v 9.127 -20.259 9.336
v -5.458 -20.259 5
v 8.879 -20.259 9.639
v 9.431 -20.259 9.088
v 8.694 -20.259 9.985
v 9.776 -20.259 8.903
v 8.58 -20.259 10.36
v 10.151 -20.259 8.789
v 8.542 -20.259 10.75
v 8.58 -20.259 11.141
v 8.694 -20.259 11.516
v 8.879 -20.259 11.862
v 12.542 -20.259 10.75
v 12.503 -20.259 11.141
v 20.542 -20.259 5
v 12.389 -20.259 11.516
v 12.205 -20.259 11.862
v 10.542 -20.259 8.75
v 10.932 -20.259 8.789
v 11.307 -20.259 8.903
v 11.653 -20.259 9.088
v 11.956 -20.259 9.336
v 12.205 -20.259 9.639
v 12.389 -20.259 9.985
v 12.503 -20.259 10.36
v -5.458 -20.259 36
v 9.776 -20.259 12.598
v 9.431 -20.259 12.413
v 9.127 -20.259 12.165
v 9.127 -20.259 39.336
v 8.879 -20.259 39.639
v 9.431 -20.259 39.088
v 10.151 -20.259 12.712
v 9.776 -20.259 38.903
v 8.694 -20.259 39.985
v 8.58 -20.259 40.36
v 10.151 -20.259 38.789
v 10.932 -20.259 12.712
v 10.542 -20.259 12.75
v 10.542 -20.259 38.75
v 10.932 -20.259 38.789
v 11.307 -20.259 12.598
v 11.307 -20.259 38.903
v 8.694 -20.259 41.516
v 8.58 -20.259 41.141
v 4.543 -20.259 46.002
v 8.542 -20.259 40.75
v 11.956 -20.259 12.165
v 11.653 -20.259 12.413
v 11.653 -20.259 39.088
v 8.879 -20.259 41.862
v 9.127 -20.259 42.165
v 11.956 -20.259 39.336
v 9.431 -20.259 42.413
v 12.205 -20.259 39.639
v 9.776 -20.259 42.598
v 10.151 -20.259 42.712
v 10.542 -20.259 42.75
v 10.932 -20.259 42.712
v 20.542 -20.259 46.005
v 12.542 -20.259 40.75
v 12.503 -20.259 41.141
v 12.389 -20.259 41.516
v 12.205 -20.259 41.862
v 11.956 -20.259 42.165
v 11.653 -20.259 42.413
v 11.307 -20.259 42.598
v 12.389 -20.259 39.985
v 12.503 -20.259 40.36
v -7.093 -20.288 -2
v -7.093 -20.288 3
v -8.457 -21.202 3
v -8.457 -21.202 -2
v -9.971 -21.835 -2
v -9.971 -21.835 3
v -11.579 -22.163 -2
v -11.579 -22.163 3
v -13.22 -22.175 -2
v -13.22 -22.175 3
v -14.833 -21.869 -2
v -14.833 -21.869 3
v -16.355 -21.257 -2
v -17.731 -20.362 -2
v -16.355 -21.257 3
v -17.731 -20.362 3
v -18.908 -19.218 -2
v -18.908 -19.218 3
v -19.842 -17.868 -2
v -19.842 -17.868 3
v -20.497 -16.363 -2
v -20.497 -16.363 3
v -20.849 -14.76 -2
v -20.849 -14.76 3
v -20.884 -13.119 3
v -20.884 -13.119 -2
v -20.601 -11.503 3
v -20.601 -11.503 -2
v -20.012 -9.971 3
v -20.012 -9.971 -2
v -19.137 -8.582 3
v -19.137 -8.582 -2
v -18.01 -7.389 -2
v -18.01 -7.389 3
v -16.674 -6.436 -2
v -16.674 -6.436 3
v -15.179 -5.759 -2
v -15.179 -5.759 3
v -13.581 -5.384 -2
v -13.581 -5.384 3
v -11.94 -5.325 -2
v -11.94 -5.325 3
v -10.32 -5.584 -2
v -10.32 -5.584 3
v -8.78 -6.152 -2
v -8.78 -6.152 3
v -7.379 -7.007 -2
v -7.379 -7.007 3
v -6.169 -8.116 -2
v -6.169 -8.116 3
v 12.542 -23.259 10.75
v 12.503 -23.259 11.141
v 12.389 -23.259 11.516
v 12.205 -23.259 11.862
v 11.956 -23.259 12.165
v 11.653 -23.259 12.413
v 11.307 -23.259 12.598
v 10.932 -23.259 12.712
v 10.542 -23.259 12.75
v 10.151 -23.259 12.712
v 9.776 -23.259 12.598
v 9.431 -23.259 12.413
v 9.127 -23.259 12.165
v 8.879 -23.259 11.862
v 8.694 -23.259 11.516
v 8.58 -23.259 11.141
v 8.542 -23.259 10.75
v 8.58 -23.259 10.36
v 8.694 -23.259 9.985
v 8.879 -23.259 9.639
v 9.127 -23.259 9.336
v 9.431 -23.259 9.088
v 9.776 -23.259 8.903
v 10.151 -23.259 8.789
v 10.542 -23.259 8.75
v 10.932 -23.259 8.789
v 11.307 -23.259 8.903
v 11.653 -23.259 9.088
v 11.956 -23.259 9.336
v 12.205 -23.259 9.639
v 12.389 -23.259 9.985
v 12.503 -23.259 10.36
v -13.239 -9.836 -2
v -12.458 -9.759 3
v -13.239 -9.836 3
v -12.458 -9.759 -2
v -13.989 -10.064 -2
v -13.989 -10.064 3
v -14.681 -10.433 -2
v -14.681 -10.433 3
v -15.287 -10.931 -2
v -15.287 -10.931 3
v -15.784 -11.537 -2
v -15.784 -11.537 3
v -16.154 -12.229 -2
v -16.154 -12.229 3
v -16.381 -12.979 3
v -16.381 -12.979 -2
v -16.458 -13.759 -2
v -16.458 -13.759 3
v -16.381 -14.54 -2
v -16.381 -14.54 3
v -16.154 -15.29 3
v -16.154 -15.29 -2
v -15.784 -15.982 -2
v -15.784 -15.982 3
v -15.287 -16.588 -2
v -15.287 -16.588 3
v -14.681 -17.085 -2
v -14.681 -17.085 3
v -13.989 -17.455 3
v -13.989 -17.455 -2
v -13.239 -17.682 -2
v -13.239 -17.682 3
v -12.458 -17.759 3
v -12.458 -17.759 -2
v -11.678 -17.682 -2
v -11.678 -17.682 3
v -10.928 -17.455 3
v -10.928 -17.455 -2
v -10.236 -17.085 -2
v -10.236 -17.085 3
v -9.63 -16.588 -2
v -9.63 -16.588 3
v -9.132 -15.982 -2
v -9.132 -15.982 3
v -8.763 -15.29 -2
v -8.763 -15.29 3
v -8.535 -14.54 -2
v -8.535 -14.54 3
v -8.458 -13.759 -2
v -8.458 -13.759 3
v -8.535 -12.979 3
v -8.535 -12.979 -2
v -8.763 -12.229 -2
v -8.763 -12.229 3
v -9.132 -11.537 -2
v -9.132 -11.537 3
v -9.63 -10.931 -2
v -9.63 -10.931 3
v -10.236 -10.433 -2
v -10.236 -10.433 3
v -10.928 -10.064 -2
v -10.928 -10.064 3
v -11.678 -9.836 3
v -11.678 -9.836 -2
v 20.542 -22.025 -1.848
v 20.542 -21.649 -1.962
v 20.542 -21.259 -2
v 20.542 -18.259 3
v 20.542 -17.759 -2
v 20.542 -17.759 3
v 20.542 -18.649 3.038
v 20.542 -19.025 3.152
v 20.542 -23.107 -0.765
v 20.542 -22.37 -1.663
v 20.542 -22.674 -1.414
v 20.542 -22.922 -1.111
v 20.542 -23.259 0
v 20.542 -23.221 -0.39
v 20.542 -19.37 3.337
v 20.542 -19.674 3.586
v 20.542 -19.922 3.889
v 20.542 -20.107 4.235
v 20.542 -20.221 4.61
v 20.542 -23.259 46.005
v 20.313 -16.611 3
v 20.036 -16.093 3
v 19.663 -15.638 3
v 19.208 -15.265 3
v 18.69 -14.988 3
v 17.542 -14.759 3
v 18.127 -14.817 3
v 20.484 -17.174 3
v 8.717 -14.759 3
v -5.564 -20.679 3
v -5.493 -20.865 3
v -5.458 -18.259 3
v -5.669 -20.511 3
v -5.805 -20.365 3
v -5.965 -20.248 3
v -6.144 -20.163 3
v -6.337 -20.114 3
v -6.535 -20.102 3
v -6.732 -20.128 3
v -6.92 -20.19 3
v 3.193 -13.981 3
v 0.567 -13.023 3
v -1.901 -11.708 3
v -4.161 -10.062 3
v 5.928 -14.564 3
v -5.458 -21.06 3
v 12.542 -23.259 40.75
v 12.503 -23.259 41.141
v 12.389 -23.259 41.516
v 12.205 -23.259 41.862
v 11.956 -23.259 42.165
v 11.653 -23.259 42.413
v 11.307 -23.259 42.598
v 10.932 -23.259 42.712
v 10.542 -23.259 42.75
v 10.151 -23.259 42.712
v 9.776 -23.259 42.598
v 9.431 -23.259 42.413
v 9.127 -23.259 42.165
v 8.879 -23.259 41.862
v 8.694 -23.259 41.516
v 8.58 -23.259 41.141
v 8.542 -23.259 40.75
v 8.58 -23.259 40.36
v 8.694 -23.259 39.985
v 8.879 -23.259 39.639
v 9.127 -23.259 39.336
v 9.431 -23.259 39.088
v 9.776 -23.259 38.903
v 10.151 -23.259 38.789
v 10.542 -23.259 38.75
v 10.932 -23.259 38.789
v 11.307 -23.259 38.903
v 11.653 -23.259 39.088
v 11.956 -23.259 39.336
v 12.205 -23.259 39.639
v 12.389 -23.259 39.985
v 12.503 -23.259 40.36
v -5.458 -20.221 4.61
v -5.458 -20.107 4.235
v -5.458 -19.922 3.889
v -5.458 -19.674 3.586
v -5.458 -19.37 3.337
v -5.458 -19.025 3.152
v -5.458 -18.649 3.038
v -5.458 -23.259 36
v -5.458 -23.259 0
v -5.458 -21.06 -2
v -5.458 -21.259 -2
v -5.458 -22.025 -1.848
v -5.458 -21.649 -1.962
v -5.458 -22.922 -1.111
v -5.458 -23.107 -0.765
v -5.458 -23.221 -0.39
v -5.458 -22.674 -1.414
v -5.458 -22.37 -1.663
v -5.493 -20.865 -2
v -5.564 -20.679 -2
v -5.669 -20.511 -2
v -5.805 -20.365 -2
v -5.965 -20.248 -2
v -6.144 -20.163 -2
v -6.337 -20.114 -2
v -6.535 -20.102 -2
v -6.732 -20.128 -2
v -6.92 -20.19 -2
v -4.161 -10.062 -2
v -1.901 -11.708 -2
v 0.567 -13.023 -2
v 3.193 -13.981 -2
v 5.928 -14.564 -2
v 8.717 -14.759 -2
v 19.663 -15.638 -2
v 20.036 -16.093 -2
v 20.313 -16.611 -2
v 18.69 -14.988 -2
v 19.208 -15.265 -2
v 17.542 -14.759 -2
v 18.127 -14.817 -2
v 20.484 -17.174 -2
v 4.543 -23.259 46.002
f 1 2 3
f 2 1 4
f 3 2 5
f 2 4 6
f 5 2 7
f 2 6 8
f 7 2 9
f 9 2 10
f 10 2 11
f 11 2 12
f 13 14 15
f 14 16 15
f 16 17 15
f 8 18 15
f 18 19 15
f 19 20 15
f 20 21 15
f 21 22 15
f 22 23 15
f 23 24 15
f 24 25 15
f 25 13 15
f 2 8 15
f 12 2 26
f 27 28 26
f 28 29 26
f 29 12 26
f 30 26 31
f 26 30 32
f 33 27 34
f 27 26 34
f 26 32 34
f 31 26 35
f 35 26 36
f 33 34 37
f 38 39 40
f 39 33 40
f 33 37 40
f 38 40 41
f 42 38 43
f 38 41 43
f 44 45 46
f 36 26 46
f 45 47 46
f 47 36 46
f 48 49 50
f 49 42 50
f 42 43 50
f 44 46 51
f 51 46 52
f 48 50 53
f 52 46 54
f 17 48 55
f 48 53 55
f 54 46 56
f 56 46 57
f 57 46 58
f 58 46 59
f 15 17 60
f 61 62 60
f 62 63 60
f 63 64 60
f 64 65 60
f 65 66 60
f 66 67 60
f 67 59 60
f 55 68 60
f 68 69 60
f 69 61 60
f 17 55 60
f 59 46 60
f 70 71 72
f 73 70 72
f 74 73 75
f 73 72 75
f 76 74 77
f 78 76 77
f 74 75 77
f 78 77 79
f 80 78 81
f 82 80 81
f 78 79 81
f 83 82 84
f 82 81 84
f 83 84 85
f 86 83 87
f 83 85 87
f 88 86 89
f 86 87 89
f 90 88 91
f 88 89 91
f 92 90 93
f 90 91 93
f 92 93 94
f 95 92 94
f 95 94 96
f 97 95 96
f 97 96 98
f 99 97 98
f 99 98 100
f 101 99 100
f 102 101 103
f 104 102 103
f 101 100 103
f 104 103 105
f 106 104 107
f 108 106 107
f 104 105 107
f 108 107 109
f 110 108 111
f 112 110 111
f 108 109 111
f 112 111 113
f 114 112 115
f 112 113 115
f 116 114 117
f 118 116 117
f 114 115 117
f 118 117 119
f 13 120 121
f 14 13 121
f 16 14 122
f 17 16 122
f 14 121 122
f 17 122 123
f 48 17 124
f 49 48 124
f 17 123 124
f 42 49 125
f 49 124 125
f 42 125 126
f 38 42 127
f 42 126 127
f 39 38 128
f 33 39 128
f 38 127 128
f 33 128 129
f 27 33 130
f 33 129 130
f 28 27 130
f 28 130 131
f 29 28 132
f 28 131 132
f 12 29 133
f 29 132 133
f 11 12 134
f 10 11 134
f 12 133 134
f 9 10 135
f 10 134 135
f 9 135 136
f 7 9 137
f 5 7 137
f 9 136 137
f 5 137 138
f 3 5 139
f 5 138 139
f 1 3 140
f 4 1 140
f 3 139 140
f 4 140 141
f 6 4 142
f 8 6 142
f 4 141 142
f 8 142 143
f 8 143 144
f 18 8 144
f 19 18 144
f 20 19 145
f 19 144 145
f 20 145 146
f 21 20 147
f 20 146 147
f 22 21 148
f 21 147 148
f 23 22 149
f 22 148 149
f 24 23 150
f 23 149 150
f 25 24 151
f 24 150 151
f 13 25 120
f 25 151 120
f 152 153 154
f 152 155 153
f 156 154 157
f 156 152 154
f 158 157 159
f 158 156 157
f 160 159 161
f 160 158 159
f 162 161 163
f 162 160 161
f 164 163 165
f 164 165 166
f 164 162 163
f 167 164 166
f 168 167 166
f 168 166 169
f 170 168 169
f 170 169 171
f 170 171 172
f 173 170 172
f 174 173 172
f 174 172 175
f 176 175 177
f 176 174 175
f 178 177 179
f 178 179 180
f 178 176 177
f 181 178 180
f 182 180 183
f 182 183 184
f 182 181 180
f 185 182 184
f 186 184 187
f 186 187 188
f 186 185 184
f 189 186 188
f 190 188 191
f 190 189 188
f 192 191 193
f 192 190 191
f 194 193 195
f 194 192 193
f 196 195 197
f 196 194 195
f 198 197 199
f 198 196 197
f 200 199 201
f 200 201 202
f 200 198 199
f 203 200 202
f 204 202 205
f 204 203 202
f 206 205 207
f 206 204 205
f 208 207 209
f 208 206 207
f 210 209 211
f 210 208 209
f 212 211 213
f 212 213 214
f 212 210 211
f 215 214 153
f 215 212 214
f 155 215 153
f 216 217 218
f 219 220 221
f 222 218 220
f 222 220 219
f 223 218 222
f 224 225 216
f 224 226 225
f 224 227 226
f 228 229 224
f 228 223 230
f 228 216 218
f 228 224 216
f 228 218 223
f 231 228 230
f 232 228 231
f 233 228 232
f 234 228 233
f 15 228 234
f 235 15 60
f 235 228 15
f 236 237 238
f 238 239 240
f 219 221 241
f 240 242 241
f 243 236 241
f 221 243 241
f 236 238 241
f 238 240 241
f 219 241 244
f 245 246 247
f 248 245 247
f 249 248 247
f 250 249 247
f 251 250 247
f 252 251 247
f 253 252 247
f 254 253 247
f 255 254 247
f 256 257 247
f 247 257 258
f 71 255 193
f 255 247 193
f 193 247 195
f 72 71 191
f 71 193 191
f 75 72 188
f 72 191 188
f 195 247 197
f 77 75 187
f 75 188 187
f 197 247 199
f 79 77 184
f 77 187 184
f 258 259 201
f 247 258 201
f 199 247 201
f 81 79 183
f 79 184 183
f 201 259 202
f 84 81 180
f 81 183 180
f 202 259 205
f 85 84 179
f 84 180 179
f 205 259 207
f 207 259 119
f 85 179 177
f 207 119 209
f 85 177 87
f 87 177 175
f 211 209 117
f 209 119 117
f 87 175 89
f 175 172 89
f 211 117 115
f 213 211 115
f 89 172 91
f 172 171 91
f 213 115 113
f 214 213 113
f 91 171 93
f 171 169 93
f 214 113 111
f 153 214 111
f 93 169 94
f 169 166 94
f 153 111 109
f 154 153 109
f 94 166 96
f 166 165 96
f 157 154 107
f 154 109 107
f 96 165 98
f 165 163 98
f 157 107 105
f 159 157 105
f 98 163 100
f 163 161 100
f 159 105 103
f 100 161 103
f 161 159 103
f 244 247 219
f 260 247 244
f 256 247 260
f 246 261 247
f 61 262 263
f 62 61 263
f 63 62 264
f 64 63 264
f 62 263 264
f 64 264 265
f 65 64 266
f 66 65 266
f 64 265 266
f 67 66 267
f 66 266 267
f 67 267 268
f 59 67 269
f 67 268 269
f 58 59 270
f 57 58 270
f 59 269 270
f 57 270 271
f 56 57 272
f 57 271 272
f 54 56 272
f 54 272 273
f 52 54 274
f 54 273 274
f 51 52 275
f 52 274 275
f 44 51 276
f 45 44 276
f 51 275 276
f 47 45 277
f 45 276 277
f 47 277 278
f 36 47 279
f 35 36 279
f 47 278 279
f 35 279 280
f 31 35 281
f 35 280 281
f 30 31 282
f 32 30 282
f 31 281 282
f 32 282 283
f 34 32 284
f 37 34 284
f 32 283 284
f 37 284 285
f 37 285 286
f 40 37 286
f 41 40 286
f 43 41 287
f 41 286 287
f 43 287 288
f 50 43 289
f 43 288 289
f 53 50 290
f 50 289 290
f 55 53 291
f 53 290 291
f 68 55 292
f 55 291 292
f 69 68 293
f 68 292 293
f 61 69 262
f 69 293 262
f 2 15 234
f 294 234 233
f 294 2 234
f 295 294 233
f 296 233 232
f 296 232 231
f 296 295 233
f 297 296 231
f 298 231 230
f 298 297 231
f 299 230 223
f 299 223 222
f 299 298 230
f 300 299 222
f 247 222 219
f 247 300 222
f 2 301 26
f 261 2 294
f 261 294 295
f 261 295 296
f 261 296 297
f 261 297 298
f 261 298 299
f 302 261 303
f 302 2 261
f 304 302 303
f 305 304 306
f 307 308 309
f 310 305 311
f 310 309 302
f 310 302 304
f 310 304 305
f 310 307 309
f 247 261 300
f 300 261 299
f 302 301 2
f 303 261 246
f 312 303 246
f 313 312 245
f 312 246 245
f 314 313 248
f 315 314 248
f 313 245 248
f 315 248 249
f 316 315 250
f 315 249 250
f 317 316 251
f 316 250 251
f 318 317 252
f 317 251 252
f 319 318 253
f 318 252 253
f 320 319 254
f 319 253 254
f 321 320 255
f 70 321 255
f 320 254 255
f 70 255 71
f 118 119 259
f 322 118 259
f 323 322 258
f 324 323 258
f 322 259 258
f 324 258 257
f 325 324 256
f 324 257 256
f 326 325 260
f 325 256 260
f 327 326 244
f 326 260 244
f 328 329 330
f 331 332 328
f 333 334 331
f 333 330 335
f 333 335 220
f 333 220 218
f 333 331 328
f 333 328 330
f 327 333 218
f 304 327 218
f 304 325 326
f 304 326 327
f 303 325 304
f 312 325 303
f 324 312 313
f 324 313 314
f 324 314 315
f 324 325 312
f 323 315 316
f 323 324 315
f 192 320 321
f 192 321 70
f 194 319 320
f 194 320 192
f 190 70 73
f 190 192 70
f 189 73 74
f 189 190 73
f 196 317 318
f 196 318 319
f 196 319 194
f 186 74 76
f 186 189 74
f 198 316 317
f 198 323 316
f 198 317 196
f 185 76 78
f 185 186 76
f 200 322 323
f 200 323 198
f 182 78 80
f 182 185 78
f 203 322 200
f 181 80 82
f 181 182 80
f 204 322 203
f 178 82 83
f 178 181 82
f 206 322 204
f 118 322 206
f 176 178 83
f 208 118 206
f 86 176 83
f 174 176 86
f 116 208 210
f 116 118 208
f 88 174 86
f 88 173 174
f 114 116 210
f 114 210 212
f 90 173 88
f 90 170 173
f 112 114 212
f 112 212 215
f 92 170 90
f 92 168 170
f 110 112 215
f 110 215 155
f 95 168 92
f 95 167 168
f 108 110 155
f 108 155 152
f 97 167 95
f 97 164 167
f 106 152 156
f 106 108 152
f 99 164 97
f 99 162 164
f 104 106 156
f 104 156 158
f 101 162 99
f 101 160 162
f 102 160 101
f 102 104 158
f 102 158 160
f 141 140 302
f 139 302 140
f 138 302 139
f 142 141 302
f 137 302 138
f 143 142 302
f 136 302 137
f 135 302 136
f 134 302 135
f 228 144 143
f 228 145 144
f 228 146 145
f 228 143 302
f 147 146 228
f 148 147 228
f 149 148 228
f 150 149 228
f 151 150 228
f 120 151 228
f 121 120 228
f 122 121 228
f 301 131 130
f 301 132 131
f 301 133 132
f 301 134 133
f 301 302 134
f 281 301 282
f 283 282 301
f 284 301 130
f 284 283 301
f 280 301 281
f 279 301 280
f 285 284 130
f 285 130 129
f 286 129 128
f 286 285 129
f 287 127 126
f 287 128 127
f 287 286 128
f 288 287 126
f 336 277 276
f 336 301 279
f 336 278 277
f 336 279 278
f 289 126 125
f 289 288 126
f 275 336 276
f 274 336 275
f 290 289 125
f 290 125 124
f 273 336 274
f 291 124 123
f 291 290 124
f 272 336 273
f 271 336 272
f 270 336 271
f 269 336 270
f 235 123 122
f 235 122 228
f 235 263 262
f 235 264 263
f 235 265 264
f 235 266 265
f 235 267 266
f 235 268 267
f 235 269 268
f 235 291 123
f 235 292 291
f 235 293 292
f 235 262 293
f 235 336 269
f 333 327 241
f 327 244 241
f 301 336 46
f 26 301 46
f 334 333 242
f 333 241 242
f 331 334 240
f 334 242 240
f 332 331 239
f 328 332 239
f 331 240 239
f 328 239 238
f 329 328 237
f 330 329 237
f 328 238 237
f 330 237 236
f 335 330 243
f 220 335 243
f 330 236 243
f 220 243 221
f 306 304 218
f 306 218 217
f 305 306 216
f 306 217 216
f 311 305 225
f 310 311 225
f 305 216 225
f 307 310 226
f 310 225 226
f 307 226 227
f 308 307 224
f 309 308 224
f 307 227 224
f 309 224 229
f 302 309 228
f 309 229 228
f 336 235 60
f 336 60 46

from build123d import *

# Parameters (mm, degrees)
EXTRUDE_1_DEPTH      = 3
EXTRUDE_1_DEPTH_BACK = 2
SKETCH_2_R           = 2
EXTRUDE_2_DEPTH      = 3
FILLET_1_R           = 2
CHAMFER_1_SIZE2      = 10.001839768
CHAMFER_1_SIZE       = 10
FILLET_2_R           = 2


with BuildPart() as part:
    # 草图1 → 凸台-拉伸1 (new body, two sides)
    with BuildSketch(Plane.XY) as extrude_1_sk:
        with BuildLine():
            ThreePointArc((-6.1689615, -8.116064678), (0.566562607, -13.023133247), (8.717166108, -14.759298421))
            Line((8.717166108, -14.759298421), (17.541649585, -14.759298421))
            ThreePointArc((17.541649585, -14.759298421), (19.662969929, -15.637978077), (20.541649585, -17.759298421))
            Line((20.541649585, -17.759298421), (20.541649585, -21.259298421))
            Line((20.541649585, -21.259298421), (-5.458350415, -21.259298421))
            Line((-5.458350415, -21.259298421), (-5.458350415, -21.060154535))
            ThreePointArc((-5.458350415, -21.060154535), (-6.052483902, -20.201263808), (-7.093271049, -20.287577169))
            ThreePointArc((-7.093271049, -20.287577169), (-20.884089955, -13.119444375), (-6.1689615, -8.116064678))
        make_face()
        with BuildLine():
            ThreePointArc((-12.458350415, -17.759298421), (-8.458350415, -13.759298421), (-12.458350415, -9.759298421))
            ThreePointArc((-12.458350415, -9.759298421), (-16.458350415, -13.759298421), (-12.458350415, -17.759298421))
        make_face(mode=Mode.SUBTRACT)
        Polygon((18.541649585, -23.259298421), (-3.458350415, -23.259298421), (-5.458350415, -23.259298421), (-5.458350415, -21.259298421), (20.541649585, -21.259298421), (20.541649585, -23.259298421), align=None)
    extrude(amount=EXTRUDE_1_DEPTH)
    extrude(extrude_1_sk.sketch, amount=-EXTRUDE_1_DEPTH_BACK)

    # 草图2 → 凸台-拉伸2 (add)
    with BuildSketch(Plane.XZ.offset(23.259298421)):
        Polygon((20.541649585, 46.004782855), (-5.458350415, 46.000000778), (-5.458350415, 2), (-5.458350415, -2), (20.541649585, -2), align=None)
        with Locations((10.541649585, 40.750439451)):
            Circle(SKETCH_2_R, mode=Mode.SUBTRACT)
        with Locations((10.541649585, 10.750439451)):
            Circle(SKETCH_2_R, mode=Mode.SUBTRACT)
    extrude(amount=-EXTRUDE_2_DEPTH)

    # 圆角1
    fillet_1_edges = [part.edges().sort_by_distance(p)[0] for p in [
        (7.541649585, -23.259298421, -2),
    ]]
    fillet(fillet_1_edges, radius=FILLET_1_R)

    # 倒角1
    chamfer_1_edges = [part.edges().sort_by_distance(p)[0] for p in [
        (-5.458350415, -21.759298421, 46.000000778),
    ]]
    chamfer(chamfer_1_edges, length=CHAMFER_1_SIZE, length2=CHAMFER_1_SIZE2)

    # 圆角2
    fillet_2_edges = [part.edges().sort_by_distance(p)[0] for p in [
        (7.541649585, -20.259298421, 3),
    ]]
    fillet(fillet_2_edges, radius=FILLET_2_R)


solid = part.part
